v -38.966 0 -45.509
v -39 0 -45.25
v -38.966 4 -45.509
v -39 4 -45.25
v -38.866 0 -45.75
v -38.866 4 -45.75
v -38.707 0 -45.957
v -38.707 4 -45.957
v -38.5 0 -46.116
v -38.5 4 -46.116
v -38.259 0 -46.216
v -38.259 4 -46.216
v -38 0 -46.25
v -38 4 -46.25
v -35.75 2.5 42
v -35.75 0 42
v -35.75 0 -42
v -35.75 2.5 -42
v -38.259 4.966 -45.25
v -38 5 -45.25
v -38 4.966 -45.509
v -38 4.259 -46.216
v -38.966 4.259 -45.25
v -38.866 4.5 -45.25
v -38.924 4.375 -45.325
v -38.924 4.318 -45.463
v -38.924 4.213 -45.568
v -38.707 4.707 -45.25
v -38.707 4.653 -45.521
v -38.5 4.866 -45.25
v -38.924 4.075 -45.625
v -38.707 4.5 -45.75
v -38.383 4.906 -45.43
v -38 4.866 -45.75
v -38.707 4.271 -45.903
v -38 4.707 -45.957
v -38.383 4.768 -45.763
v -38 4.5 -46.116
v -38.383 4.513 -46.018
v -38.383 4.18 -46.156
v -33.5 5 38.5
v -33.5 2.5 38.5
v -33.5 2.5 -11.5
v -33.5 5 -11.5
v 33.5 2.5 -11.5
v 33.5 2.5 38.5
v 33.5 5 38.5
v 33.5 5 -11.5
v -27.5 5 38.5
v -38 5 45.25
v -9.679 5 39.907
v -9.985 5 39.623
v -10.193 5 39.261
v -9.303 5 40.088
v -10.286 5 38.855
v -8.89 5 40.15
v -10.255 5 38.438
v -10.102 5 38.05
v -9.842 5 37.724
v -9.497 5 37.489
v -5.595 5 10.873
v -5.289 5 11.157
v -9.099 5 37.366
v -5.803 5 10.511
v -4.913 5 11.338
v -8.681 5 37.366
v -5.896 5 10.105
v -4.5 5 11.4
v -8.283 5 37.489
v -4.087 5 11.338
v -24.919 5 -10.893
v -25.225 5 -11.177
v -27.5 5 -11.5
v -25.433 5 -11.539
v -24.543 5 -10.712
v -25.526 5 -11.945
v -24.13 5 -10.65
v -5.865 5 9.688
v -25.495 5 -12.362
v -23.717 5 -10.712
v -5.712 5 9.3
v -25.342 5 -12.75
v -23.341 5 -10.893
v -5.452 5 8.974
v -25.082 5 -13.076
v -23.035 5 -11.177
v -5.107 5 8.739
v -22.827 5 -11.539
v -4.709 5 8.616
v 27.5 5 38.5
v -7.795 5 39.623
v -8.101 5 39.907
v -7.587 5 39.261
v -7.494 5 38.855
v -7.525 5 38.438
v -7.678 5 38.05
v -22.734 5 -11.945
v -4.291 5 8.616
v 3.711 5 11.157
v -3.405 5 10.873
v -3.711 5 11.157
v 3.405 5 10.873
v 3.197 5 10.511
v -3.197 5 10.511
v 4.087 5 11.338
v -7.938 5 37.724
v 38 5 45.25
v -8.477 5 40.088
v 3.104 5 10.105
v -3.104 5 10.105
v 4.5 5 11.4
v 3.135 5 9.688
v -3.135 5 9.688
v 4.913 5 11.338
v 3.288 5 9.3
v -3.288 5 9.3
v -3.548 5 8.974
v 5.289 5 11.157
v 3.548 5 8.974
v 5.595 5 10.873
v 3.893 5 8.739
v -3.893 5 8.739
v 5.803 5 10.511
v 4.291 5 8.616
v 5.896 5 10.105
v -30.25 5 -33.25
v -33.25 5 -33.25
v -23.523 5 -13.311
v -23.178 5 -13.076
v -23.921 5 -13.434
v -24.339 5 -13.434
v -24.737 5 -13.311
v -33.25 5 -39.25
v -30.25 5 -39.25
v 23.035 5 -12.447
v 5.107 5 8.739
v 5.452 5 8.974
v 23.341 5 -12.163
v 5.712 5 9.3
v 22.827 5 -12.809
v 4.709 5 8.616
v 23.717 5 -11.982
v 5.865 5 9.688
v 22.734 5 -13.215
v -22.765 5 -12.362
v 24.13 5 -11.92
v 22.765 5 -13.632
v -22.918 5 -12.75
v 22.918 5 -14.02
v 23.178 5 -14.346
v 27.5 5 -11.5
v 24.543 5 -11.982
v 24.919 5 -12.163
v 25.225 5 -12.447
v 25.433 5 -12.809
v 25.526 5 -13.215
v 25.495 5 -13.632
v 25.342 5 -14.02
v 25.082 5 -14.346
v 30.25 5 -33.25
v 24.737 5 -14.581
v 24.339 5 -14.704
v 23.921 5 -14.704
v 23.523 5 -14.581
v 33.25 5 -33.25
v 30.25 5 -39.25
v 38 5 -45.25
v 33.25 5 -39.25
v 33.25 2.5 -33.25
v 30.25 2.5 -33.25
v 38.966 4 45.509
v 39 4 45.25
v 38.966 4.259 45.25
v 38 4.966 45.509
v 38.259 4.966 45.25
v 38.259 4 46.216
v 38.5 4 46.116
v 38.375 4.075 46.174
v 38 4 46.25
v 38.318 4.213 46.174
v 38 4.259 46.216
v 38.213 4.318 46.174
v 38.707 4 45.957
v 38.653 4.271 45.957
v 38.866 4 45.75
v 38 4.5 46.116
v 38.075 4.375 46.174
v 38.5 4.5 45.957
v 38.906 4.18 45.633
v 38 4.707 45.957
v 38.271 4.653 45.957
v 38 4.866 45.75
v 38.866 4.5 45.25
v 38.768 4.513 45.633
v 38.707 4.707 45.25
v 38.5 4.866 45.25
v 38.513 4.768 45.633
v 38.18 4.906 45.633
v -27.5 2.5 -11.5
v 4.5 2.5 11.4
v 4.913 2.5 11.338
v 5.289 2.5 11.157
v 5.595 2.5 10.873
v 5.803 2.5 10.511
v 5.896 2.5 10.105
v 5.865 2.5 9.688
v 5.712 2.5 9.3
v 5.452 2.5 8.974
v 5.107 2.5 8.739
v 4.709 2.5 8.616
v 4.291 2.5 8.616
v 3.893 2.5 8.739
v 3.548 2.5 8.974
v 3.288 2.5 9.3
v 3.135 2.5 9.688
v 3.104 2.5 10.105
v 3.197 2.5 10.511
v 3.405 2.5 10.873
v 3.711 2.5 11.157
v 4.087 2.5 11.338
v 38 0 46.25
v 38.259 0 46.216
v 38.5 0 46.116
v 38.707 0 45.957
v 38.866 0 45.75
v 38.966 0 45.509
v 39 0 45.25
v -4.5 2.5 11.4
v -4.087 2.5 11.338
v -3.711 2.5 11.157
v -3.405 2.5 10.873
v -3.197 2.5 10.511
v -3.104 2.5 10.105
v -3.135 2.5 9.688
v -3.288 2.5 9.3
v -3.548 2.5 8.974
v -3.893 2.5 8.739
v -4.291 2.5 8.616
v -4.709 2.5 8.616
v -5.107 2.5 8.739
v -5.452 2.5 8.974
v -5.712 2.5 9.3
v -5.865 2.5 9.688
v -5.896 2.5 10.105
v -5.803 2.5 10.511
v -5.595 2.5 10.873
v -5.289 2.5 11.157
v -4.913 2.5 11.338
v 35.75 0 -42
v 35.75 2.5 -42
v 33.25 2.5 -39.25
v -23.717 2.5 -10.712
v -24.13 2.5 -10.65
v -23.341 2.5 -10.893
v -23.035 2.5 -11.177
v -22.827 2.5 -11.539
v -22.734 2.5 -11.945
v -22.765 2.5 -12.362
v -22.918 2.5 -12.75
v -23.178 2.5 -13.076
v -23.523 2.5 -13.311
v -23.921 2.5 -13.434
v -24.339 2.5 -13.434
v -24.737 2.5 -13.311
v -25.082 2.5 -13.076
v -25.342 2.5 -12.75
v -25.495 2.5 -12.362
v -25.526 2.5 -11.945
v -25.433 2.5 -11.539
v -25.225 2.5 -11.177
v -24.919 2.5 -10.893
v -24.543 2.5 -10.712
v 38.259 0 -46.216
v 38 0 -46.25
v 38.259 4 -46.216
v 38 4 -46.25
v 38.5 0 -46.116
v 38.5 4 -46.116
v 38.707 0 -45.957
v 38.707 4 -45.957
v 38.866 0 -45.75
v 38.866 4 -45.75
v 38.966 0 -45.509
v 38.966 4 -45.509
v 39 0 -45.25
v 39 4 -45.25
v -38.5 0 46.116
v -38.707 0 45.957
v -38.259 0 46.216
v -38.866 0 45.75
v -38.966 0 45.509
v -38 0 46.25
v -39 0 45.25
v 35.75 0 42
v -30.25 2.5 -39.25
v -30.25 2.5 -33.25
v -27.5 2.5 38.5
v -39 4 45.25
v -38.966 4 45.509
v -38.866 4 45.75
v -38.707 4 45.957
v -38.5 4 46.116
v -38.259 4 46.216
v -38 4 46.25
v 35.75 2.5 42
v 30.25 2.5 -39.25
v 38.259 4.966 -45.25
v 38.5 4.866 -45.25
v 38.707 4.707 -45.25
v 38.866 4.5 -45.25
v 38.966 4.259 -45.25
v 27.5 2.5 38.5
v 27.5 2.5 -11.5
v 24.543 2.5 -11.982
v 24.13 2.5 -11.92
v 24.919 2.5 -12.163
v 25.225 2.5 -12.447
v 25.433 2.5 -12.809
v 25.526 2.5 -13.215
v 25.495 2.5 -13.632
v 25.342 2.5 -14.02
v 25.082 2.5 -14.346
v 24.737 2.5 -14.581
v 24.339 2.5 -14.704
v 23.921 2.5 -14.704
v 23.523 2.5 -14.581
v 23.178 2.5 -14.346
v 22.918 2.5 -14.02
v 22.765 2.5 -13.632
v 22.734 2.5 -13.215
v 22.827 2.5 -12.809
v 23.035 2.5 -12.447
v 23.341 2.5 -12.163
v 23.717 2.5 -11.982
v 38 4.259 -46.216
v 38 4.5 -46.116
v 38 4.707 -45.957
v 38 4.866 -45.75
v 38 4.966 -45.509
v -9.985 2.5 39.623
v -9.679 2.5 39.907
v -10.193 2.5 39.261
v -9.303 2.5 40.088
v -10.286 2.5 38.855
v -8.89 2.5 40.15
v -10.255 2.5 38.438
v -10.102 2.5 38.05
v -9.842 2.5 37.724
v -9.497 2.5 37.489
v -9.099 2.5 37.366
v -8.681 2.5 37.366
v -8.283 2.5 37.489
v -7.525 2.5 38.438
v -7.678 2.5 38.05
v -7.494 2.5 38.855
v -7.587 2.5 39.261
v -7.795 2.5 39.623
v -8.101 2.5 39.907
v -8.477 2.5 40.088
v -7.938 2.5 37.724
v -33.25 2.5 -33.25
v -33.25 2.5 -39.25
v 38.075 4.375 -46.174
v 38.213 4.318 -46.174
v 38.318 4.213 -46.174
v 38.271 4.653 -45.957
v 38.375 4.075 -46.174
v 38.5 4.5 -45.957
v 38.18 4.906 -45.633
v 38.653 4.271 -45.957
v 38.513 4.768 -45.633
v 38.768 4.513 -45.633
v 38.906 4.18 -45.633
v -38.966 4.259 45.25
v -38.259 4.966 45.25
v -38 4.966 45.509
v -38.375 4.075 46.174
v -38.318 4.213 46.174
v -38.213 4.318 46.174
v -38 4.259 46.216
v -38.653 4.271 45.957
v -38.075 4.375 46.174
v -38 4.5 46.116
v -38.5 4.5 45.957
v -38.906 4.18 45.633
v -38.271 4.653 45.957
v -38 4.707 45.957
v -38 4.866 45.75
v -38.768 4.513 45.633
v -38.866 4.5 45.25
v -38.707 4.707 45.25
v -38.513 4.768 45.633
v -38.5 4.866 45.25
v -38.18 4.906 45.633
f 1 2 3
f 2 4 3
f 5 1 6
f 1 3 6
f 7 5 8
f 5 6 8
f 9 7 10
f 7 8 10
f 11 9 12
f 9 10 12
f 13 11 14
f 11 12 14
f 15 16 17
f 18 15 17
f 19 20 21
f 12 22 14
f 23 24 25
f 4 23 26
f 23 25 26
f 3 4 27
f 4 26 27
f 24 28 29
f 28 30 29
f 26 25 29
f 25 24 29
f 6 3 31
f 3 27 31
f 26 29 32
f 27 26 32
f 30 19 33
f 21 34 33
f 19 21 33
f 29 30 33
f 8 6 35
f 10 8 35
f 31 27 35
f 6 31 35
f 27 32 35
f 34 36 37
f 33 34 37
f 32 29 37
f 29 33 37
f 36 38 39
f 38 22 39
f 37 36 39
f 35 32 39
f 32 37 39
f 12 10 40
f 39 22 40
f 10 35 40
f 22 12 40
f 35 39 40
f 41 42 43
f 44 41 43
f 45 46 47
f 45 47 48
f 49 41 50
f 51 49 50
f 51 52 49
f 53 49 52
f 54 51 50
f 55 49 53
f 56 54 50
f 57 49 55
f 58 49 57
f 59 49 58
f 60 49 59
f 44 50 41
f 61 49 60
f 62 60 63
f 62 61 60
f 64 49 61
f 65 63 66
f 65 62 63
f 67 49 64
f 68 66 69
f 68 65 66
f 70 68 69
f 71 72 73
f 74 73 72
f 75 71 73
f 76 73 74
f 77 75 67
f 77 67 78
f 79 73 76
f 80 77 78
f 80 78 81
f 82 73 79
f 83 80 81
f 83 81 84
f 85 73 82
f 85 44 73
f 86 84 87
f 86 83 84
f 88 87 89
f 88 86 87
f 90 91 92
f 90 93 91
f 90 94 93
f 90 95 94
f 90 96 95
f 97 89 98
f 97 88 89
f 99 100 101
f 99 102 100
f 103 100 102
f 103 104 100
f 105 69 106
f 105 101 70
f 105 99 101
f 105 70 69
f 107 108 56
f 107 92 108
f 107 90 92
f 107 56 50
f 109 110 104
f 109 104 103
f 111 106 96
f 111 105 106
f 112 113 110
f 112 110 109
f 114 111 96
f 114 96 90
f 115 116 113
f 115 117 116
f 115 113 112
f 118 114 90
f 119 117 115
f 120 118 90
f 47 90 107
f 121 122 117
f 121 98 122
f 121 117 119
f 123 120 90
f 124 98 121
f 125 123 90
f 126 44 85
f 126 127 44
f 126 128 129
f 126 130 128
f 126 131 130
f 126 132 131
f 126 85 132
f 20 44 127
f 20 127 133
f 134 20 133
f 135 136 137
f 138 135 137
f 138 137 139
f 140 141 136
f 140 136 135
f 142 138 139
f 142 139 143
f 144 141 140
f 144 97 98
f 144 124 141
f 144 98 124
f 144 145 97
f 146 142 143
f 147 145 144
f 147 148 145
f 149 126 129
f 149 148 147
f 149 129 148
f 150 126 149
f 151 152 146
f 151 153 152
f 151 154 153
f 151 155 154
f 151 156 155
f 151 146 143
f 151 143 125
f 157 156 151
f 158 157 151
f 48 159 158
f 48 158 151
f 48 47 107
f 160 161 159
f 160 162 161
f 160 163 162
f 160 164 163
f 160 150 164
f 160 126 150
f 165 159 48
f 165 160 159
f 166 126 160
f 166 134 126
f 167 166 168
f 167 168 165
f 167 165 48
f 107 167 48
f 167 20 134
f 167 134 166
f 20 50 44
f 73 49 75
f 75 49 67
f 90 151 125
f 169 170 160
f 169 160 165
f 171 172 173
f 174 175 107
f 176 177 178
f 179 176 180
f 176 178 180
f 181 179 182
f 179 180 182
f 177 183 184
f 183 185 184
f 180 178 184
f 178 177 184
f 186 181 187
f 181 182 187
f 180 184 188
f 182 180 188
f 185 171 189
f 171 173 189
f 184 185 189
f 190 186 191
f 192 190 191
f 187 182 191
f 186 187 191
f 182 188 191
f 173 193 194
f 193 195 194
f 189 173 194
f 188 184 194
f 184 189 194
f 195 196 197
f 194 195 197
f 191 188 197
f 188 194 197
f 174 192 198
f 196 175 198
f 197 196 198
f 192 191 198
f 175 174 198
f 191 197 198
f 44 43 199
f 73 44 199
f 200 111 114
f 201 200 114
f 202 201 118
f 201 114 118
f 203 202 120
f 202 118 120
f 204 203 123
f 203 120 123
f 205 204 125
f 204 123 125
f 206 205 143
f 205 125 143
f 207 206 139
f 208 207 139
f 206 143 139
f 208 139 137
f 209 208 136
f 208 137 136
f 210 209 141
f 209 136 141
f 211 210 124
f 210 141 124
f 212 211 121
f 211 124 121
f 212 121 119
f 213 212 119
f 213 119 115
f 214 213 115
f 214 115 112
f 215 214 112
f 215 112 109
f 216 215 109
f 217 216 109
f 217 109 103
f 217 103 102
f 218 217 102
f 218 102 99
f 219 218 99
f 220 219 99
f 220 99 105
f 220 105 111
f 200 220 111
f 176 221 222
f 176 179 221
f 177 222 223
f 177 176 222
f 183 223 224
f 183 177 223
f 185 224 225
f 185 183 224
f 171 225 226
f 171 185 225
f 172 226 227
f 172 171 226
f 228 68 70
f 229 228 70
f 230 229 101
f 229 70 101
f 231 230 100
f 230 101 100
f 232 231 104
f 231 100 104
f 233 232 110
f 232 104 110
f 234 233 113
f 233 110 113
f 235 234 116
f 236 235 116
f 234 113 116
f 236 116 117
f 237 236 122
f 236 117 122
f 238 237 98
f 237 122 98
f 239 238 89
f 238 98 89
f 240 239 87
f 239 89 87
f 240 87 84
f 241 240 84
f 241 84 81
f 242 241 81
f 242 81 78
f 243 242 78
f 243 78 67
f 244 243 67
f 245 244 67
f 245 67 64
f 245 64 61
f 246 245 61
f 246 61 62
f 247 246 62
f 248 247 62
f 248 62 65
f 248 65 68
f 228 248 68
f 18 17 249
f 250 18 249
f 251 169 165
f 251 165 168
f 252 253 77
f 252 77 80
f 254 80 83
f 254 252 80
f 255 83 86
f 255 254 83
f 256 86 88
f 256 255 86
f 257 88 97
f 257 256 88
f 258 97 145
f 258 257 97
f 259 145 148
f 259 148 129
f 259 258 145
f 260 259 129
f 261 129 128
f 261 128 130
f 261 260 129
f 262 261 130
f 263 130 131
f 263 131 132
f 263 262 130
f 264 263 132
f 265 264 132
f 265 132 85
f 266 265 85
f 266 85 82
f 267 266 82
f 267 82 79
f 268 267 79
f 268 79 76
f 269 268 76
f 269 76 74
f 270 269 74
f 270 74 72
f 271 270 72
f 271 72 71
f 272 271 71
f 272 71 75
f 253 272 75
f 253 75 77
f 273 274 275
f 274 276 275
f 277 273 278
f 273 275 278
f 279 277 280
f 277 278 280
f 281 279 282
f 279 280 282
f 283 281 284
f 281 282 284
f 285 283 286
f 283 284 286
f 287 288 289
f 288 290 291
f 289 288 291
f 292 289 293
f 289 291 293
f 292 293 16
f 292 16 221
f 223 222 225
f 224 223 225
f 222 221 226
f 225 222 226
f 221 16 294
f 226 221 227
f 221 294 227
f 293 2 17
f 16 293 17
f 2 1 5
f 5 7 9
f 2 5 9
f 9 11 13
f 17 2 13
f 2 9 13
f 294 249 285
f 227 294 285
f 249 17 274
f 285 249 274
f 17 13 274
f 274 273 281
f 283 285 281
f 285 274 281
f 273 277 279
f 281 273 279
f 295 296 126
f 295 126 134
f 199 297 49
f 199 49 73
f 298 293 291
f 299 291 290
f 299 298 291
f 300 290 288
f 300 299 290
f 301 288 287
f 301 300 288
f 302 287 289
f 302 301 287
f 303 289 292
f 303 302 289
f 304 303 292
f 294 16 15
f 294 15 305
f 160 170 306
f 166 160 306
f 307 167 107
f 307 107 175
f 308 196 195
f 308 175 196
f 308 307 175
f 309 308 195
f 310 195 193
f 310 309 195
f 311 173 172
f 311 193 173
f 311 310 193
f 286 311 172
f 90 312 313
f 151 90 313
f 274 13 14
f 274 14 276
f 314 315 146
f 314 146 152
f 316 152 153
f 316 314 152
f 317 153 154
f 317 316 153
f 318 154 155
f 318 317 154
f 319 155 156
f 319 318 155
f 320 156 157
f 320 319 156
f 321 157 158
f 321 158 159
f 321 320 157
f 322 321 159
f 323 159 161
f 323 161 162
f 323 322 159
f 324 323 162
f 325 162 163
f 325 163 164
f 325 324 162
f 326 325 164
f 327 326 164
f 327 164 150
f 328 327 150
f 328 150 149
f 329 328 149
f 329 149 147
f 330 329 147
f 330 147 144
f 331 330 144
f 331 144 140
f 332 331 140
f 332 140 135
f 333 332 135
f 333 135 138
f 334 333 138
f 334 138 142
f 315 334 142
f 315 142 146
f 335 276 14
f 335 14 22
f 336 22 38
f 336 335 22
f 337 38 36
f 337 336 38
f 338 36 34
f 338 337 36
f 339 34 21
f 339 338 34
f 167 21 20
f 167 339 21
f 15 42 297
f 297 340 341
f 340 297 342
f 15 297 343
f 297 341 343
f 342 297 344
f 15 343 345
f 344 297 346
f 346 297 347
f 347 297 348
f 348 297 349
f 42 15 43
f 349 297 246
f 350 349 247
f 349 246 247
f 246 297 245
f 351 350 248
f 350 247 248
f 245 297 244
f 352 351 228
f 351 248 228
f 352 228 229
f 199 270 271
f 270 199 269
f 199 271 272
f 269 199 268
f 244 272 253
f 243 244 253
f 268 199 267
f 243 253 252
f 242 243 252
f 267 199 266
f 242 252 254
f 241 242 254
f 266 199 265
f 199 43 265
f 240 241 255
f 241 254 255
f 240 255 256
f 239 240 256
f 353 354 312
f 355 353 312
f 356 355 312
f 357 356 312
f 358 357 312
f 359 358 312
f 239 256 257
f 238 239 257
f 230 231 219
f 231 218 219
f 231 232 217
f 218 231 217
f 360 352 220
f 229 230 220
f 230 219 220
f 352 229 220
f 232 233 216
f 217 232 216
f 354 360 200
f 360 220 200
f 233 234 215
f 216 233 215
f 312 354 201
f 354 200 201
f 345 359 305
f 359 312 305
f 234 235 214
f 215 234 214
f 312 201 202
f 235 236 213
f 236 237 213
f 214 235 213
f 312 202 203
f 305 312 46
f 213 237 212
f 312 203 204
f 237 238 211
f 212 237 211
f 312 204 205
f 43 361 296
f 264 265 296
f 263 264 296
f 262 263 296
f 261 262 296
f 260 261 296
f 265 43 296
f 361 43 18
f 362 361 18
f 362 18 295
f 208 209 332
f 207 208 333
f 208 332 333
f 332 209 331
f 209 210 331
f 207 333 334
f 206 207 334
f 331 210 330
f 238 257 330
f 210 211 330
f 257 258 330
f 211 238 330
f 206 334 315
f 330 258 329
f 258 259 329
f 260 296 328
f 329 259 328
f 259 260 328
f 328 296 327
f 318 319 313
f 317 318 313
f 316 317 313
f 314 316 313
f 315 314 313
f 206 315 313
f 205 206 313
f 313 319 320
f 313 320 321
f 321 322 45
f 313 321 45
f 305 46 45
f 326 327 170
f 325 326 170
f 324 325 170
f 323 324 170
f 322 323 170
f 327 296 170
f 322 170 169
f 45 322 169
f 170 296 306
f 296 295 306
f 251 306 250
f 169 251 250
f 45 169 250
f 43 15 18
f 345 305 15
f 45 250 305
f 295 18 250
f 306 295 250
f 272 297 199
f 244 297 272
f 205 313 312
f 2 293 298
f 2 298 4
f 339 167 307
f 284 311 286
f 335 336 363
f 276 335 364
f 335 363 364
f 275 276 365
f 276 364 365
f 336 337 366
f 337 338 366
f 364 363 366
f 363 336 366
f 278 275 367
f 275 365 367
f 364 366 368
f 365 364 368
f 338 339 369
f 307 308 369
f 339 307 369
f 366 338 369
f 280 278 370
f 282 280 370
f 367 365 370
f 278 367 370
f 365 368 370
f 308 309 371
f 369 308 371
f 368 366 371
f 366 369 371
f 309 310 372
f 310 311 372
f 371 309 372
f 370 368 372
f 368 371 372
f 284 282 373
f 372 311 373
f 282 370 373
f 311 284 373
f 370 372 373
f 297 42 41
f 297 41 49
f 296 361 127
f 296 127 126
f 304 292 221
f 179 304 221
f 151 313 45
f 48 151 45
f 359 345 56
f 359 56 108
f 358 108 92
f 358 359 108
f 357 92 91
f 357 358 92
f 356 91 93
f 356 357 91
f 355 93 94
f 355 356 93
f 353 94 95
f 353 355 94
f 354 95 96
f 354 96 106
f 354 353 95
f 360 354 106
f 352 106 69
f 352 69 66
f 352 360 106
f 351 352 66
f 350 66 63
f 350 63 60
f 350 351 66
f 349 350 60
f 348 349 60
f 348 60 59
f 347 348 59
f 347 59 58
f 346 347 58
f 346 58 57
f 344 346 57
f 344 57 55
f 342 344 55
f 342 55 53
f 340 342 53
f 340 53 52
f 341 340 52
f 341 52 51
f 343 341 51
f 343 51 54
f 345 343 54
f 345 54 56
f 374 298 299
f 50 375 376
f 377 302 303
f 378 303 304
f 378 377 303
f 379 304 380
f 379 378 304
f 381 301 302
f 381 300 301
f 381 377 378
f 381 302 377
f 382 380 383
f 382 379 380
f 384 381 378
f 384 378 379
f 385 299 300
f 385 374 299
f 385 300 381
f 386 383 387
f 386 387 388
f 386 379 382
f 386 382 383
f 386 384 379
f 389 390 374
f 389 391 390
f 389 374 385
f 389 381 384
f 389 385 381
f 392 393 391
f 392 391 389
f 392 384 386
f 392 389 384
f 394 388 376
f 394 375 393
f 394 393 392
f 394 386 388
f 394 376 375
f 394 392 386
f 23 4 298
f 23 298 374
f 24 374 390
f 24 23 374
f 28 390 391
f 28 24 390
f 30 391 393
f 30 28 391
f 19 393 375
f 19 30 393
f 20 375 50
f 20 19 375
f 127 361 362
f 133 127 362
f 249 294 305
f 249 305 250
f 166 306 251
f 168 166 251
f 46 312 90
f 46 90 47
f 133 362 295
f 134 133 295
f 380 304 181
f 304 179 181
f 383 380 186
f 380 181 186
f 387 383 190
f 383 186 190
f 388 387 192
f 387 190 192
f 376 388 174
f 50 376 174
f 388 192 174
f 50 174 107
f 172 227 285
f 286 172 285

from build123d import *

# Parameters (mm, degrees)
SKETCH1_W                         = 78
SKETCH1_H                         = 92.5
SKETCH1_R                         = 1.4
SKETCH1_W_2                       = 6
SKETCH1_H_2                       = 50
SKETCH1_W_3                       = 3
SKETCH1_H_3                       = 6
BASE_DEPTH                        = 5
SKETCH2_W                         = 71.5
SKETCH2_H                         = 84
PCB_CUTOUT_DEPTH                  = 2.5
F_1MM_EDGE_FILLETS_R              = 1
BASKET_CLAMP_MOUNTING_HOLES_REACH = 62.705
SKETCH3_R                         = 1.4


with BuildPart() as part:
    # Sketch1 → Base (new body)
    with BuildSketch(Plane(origin=(0, 0, 0), x_dir=(1, 0, 0), z_dir=(0, 1, 0))):
        Rectangle(SKETCH1_W, SKETCH1_H)
        with Locations((-24.13, 12.05)):
            Circle(SKETCH1_R, mode=Mode.SUBTRACT)
        with Locations((24.13, 13.32)):
            Circle(SKETCH1_R, mode=Mode.SUBTRACT)
        with Locations((-8.89, -38.75)):
            Circle(SKETCH1_R, mode=Mode.SUBTRACT)
        with Locations((-30.5, -13.5)):
            Rectangle(SKETCH1_W_2, SKETCH1_H_2, mode=Mode.SUBTRACT)
        with Locations((30.5, -13.5)):
            Rectangle(SKETCH1_W_2, SKETCH1_H_2, mode=Mode.SUBTRACT)
        with Locations((31.75, 36.25)):
            Rectangle(SKETCH1_W_3, SKETCH1_H_3, mode=Mode.SUBTRACT)
        with Locations((-31.75, 36.25)):
            Rectangle(SKETCH1_W_3, SKETCH1_H_3, mode=Mode.SUBTRACT)
    extrude(amount=BASE_DEPTH)

    # Sketch2 → PCB Cutout (cut)
    with BuildSketch(Plane(origin=(0, 0, 0), x_dir=(1, 0, 0), z_dir=(0, 1, 0))):
        Rectangle(SKETCH2_W, SKETCH2_H)
    extrude(amount=PCB_CUTOUT_DEPTH, mode=Mode.SUBTRACT)

    # 1mm Edge Fillets
    f_1mm_edge_fillets_edges = [part.edges().sort_by_distance(p)[0] for p in [
        (-39, 2.5, -46.25),
        (0, 5, -46.25),
        (39, 2.5, -46.25),
        (39, 5, 0),
        (39, 2.5, 46.25),
        (0, 5, 46.25),
        (-39, 5, 0),
        (-39, 2.5, 46.25),
    ]]
    fillet(f_1mm_edge_fillets_edges, radius=F_1MM_EDGE_FILLETS_R)

    # Sketch3 → Basket Clamp Mounting Holes (cut, up to next)
    with BuildSketch(Plane(origin=(0, 5, 0), x_dir=(1, 0, 0), z_dir=(0, 1, 0)), mode=Mode.PRIVATE) as basket_clamp_mounting_holes_sk1:
        with Locations((-4.5, -10)):
            Circle(SKETCH3_R)
    basket_clamp_mounting_holes_tool1 = extrude(basket_clamp_mounting_holes_sk1.sketch, amount=-BASKET_CLAMP_MOUNTING_HOLES_REACH, mode=Mode.PRIVATE) & part.part
    # Sketch3 → Basket Clamp Mounting Holes (cut, up to next)
    with BuildSketch(Plane(origin=(0, 5, 0), x_dir=(1, 0, 0), z_dir=(0, 1, 0)), mode=Mode.PRIVATE) as basket_clamp_mounting_holes_sk2:
        with Locations((4.5, -10)):
            Circle(SKETCH3_R)
    basket_clamp_mounting_holes_tool2 = extrude(basket_clamp_mounting_holes_sk2.sketch, amount=-BASKET_CLAMP_MOUNTING_HOLES_REACH, mode=Mode.PRIVATE) & part.part
    add(basket_clamp_mounting_holes_tool1.solids().sort_by_distance((-4.5, 5, 10))[0], mode=Mode.SUBTRACT)
    add(basket_clamp_mounting_holes_tool2.solids().sort_by_distance((4.5, 5, 10))[0], mode=Mode.SUBTRACT)


solid = part.part
